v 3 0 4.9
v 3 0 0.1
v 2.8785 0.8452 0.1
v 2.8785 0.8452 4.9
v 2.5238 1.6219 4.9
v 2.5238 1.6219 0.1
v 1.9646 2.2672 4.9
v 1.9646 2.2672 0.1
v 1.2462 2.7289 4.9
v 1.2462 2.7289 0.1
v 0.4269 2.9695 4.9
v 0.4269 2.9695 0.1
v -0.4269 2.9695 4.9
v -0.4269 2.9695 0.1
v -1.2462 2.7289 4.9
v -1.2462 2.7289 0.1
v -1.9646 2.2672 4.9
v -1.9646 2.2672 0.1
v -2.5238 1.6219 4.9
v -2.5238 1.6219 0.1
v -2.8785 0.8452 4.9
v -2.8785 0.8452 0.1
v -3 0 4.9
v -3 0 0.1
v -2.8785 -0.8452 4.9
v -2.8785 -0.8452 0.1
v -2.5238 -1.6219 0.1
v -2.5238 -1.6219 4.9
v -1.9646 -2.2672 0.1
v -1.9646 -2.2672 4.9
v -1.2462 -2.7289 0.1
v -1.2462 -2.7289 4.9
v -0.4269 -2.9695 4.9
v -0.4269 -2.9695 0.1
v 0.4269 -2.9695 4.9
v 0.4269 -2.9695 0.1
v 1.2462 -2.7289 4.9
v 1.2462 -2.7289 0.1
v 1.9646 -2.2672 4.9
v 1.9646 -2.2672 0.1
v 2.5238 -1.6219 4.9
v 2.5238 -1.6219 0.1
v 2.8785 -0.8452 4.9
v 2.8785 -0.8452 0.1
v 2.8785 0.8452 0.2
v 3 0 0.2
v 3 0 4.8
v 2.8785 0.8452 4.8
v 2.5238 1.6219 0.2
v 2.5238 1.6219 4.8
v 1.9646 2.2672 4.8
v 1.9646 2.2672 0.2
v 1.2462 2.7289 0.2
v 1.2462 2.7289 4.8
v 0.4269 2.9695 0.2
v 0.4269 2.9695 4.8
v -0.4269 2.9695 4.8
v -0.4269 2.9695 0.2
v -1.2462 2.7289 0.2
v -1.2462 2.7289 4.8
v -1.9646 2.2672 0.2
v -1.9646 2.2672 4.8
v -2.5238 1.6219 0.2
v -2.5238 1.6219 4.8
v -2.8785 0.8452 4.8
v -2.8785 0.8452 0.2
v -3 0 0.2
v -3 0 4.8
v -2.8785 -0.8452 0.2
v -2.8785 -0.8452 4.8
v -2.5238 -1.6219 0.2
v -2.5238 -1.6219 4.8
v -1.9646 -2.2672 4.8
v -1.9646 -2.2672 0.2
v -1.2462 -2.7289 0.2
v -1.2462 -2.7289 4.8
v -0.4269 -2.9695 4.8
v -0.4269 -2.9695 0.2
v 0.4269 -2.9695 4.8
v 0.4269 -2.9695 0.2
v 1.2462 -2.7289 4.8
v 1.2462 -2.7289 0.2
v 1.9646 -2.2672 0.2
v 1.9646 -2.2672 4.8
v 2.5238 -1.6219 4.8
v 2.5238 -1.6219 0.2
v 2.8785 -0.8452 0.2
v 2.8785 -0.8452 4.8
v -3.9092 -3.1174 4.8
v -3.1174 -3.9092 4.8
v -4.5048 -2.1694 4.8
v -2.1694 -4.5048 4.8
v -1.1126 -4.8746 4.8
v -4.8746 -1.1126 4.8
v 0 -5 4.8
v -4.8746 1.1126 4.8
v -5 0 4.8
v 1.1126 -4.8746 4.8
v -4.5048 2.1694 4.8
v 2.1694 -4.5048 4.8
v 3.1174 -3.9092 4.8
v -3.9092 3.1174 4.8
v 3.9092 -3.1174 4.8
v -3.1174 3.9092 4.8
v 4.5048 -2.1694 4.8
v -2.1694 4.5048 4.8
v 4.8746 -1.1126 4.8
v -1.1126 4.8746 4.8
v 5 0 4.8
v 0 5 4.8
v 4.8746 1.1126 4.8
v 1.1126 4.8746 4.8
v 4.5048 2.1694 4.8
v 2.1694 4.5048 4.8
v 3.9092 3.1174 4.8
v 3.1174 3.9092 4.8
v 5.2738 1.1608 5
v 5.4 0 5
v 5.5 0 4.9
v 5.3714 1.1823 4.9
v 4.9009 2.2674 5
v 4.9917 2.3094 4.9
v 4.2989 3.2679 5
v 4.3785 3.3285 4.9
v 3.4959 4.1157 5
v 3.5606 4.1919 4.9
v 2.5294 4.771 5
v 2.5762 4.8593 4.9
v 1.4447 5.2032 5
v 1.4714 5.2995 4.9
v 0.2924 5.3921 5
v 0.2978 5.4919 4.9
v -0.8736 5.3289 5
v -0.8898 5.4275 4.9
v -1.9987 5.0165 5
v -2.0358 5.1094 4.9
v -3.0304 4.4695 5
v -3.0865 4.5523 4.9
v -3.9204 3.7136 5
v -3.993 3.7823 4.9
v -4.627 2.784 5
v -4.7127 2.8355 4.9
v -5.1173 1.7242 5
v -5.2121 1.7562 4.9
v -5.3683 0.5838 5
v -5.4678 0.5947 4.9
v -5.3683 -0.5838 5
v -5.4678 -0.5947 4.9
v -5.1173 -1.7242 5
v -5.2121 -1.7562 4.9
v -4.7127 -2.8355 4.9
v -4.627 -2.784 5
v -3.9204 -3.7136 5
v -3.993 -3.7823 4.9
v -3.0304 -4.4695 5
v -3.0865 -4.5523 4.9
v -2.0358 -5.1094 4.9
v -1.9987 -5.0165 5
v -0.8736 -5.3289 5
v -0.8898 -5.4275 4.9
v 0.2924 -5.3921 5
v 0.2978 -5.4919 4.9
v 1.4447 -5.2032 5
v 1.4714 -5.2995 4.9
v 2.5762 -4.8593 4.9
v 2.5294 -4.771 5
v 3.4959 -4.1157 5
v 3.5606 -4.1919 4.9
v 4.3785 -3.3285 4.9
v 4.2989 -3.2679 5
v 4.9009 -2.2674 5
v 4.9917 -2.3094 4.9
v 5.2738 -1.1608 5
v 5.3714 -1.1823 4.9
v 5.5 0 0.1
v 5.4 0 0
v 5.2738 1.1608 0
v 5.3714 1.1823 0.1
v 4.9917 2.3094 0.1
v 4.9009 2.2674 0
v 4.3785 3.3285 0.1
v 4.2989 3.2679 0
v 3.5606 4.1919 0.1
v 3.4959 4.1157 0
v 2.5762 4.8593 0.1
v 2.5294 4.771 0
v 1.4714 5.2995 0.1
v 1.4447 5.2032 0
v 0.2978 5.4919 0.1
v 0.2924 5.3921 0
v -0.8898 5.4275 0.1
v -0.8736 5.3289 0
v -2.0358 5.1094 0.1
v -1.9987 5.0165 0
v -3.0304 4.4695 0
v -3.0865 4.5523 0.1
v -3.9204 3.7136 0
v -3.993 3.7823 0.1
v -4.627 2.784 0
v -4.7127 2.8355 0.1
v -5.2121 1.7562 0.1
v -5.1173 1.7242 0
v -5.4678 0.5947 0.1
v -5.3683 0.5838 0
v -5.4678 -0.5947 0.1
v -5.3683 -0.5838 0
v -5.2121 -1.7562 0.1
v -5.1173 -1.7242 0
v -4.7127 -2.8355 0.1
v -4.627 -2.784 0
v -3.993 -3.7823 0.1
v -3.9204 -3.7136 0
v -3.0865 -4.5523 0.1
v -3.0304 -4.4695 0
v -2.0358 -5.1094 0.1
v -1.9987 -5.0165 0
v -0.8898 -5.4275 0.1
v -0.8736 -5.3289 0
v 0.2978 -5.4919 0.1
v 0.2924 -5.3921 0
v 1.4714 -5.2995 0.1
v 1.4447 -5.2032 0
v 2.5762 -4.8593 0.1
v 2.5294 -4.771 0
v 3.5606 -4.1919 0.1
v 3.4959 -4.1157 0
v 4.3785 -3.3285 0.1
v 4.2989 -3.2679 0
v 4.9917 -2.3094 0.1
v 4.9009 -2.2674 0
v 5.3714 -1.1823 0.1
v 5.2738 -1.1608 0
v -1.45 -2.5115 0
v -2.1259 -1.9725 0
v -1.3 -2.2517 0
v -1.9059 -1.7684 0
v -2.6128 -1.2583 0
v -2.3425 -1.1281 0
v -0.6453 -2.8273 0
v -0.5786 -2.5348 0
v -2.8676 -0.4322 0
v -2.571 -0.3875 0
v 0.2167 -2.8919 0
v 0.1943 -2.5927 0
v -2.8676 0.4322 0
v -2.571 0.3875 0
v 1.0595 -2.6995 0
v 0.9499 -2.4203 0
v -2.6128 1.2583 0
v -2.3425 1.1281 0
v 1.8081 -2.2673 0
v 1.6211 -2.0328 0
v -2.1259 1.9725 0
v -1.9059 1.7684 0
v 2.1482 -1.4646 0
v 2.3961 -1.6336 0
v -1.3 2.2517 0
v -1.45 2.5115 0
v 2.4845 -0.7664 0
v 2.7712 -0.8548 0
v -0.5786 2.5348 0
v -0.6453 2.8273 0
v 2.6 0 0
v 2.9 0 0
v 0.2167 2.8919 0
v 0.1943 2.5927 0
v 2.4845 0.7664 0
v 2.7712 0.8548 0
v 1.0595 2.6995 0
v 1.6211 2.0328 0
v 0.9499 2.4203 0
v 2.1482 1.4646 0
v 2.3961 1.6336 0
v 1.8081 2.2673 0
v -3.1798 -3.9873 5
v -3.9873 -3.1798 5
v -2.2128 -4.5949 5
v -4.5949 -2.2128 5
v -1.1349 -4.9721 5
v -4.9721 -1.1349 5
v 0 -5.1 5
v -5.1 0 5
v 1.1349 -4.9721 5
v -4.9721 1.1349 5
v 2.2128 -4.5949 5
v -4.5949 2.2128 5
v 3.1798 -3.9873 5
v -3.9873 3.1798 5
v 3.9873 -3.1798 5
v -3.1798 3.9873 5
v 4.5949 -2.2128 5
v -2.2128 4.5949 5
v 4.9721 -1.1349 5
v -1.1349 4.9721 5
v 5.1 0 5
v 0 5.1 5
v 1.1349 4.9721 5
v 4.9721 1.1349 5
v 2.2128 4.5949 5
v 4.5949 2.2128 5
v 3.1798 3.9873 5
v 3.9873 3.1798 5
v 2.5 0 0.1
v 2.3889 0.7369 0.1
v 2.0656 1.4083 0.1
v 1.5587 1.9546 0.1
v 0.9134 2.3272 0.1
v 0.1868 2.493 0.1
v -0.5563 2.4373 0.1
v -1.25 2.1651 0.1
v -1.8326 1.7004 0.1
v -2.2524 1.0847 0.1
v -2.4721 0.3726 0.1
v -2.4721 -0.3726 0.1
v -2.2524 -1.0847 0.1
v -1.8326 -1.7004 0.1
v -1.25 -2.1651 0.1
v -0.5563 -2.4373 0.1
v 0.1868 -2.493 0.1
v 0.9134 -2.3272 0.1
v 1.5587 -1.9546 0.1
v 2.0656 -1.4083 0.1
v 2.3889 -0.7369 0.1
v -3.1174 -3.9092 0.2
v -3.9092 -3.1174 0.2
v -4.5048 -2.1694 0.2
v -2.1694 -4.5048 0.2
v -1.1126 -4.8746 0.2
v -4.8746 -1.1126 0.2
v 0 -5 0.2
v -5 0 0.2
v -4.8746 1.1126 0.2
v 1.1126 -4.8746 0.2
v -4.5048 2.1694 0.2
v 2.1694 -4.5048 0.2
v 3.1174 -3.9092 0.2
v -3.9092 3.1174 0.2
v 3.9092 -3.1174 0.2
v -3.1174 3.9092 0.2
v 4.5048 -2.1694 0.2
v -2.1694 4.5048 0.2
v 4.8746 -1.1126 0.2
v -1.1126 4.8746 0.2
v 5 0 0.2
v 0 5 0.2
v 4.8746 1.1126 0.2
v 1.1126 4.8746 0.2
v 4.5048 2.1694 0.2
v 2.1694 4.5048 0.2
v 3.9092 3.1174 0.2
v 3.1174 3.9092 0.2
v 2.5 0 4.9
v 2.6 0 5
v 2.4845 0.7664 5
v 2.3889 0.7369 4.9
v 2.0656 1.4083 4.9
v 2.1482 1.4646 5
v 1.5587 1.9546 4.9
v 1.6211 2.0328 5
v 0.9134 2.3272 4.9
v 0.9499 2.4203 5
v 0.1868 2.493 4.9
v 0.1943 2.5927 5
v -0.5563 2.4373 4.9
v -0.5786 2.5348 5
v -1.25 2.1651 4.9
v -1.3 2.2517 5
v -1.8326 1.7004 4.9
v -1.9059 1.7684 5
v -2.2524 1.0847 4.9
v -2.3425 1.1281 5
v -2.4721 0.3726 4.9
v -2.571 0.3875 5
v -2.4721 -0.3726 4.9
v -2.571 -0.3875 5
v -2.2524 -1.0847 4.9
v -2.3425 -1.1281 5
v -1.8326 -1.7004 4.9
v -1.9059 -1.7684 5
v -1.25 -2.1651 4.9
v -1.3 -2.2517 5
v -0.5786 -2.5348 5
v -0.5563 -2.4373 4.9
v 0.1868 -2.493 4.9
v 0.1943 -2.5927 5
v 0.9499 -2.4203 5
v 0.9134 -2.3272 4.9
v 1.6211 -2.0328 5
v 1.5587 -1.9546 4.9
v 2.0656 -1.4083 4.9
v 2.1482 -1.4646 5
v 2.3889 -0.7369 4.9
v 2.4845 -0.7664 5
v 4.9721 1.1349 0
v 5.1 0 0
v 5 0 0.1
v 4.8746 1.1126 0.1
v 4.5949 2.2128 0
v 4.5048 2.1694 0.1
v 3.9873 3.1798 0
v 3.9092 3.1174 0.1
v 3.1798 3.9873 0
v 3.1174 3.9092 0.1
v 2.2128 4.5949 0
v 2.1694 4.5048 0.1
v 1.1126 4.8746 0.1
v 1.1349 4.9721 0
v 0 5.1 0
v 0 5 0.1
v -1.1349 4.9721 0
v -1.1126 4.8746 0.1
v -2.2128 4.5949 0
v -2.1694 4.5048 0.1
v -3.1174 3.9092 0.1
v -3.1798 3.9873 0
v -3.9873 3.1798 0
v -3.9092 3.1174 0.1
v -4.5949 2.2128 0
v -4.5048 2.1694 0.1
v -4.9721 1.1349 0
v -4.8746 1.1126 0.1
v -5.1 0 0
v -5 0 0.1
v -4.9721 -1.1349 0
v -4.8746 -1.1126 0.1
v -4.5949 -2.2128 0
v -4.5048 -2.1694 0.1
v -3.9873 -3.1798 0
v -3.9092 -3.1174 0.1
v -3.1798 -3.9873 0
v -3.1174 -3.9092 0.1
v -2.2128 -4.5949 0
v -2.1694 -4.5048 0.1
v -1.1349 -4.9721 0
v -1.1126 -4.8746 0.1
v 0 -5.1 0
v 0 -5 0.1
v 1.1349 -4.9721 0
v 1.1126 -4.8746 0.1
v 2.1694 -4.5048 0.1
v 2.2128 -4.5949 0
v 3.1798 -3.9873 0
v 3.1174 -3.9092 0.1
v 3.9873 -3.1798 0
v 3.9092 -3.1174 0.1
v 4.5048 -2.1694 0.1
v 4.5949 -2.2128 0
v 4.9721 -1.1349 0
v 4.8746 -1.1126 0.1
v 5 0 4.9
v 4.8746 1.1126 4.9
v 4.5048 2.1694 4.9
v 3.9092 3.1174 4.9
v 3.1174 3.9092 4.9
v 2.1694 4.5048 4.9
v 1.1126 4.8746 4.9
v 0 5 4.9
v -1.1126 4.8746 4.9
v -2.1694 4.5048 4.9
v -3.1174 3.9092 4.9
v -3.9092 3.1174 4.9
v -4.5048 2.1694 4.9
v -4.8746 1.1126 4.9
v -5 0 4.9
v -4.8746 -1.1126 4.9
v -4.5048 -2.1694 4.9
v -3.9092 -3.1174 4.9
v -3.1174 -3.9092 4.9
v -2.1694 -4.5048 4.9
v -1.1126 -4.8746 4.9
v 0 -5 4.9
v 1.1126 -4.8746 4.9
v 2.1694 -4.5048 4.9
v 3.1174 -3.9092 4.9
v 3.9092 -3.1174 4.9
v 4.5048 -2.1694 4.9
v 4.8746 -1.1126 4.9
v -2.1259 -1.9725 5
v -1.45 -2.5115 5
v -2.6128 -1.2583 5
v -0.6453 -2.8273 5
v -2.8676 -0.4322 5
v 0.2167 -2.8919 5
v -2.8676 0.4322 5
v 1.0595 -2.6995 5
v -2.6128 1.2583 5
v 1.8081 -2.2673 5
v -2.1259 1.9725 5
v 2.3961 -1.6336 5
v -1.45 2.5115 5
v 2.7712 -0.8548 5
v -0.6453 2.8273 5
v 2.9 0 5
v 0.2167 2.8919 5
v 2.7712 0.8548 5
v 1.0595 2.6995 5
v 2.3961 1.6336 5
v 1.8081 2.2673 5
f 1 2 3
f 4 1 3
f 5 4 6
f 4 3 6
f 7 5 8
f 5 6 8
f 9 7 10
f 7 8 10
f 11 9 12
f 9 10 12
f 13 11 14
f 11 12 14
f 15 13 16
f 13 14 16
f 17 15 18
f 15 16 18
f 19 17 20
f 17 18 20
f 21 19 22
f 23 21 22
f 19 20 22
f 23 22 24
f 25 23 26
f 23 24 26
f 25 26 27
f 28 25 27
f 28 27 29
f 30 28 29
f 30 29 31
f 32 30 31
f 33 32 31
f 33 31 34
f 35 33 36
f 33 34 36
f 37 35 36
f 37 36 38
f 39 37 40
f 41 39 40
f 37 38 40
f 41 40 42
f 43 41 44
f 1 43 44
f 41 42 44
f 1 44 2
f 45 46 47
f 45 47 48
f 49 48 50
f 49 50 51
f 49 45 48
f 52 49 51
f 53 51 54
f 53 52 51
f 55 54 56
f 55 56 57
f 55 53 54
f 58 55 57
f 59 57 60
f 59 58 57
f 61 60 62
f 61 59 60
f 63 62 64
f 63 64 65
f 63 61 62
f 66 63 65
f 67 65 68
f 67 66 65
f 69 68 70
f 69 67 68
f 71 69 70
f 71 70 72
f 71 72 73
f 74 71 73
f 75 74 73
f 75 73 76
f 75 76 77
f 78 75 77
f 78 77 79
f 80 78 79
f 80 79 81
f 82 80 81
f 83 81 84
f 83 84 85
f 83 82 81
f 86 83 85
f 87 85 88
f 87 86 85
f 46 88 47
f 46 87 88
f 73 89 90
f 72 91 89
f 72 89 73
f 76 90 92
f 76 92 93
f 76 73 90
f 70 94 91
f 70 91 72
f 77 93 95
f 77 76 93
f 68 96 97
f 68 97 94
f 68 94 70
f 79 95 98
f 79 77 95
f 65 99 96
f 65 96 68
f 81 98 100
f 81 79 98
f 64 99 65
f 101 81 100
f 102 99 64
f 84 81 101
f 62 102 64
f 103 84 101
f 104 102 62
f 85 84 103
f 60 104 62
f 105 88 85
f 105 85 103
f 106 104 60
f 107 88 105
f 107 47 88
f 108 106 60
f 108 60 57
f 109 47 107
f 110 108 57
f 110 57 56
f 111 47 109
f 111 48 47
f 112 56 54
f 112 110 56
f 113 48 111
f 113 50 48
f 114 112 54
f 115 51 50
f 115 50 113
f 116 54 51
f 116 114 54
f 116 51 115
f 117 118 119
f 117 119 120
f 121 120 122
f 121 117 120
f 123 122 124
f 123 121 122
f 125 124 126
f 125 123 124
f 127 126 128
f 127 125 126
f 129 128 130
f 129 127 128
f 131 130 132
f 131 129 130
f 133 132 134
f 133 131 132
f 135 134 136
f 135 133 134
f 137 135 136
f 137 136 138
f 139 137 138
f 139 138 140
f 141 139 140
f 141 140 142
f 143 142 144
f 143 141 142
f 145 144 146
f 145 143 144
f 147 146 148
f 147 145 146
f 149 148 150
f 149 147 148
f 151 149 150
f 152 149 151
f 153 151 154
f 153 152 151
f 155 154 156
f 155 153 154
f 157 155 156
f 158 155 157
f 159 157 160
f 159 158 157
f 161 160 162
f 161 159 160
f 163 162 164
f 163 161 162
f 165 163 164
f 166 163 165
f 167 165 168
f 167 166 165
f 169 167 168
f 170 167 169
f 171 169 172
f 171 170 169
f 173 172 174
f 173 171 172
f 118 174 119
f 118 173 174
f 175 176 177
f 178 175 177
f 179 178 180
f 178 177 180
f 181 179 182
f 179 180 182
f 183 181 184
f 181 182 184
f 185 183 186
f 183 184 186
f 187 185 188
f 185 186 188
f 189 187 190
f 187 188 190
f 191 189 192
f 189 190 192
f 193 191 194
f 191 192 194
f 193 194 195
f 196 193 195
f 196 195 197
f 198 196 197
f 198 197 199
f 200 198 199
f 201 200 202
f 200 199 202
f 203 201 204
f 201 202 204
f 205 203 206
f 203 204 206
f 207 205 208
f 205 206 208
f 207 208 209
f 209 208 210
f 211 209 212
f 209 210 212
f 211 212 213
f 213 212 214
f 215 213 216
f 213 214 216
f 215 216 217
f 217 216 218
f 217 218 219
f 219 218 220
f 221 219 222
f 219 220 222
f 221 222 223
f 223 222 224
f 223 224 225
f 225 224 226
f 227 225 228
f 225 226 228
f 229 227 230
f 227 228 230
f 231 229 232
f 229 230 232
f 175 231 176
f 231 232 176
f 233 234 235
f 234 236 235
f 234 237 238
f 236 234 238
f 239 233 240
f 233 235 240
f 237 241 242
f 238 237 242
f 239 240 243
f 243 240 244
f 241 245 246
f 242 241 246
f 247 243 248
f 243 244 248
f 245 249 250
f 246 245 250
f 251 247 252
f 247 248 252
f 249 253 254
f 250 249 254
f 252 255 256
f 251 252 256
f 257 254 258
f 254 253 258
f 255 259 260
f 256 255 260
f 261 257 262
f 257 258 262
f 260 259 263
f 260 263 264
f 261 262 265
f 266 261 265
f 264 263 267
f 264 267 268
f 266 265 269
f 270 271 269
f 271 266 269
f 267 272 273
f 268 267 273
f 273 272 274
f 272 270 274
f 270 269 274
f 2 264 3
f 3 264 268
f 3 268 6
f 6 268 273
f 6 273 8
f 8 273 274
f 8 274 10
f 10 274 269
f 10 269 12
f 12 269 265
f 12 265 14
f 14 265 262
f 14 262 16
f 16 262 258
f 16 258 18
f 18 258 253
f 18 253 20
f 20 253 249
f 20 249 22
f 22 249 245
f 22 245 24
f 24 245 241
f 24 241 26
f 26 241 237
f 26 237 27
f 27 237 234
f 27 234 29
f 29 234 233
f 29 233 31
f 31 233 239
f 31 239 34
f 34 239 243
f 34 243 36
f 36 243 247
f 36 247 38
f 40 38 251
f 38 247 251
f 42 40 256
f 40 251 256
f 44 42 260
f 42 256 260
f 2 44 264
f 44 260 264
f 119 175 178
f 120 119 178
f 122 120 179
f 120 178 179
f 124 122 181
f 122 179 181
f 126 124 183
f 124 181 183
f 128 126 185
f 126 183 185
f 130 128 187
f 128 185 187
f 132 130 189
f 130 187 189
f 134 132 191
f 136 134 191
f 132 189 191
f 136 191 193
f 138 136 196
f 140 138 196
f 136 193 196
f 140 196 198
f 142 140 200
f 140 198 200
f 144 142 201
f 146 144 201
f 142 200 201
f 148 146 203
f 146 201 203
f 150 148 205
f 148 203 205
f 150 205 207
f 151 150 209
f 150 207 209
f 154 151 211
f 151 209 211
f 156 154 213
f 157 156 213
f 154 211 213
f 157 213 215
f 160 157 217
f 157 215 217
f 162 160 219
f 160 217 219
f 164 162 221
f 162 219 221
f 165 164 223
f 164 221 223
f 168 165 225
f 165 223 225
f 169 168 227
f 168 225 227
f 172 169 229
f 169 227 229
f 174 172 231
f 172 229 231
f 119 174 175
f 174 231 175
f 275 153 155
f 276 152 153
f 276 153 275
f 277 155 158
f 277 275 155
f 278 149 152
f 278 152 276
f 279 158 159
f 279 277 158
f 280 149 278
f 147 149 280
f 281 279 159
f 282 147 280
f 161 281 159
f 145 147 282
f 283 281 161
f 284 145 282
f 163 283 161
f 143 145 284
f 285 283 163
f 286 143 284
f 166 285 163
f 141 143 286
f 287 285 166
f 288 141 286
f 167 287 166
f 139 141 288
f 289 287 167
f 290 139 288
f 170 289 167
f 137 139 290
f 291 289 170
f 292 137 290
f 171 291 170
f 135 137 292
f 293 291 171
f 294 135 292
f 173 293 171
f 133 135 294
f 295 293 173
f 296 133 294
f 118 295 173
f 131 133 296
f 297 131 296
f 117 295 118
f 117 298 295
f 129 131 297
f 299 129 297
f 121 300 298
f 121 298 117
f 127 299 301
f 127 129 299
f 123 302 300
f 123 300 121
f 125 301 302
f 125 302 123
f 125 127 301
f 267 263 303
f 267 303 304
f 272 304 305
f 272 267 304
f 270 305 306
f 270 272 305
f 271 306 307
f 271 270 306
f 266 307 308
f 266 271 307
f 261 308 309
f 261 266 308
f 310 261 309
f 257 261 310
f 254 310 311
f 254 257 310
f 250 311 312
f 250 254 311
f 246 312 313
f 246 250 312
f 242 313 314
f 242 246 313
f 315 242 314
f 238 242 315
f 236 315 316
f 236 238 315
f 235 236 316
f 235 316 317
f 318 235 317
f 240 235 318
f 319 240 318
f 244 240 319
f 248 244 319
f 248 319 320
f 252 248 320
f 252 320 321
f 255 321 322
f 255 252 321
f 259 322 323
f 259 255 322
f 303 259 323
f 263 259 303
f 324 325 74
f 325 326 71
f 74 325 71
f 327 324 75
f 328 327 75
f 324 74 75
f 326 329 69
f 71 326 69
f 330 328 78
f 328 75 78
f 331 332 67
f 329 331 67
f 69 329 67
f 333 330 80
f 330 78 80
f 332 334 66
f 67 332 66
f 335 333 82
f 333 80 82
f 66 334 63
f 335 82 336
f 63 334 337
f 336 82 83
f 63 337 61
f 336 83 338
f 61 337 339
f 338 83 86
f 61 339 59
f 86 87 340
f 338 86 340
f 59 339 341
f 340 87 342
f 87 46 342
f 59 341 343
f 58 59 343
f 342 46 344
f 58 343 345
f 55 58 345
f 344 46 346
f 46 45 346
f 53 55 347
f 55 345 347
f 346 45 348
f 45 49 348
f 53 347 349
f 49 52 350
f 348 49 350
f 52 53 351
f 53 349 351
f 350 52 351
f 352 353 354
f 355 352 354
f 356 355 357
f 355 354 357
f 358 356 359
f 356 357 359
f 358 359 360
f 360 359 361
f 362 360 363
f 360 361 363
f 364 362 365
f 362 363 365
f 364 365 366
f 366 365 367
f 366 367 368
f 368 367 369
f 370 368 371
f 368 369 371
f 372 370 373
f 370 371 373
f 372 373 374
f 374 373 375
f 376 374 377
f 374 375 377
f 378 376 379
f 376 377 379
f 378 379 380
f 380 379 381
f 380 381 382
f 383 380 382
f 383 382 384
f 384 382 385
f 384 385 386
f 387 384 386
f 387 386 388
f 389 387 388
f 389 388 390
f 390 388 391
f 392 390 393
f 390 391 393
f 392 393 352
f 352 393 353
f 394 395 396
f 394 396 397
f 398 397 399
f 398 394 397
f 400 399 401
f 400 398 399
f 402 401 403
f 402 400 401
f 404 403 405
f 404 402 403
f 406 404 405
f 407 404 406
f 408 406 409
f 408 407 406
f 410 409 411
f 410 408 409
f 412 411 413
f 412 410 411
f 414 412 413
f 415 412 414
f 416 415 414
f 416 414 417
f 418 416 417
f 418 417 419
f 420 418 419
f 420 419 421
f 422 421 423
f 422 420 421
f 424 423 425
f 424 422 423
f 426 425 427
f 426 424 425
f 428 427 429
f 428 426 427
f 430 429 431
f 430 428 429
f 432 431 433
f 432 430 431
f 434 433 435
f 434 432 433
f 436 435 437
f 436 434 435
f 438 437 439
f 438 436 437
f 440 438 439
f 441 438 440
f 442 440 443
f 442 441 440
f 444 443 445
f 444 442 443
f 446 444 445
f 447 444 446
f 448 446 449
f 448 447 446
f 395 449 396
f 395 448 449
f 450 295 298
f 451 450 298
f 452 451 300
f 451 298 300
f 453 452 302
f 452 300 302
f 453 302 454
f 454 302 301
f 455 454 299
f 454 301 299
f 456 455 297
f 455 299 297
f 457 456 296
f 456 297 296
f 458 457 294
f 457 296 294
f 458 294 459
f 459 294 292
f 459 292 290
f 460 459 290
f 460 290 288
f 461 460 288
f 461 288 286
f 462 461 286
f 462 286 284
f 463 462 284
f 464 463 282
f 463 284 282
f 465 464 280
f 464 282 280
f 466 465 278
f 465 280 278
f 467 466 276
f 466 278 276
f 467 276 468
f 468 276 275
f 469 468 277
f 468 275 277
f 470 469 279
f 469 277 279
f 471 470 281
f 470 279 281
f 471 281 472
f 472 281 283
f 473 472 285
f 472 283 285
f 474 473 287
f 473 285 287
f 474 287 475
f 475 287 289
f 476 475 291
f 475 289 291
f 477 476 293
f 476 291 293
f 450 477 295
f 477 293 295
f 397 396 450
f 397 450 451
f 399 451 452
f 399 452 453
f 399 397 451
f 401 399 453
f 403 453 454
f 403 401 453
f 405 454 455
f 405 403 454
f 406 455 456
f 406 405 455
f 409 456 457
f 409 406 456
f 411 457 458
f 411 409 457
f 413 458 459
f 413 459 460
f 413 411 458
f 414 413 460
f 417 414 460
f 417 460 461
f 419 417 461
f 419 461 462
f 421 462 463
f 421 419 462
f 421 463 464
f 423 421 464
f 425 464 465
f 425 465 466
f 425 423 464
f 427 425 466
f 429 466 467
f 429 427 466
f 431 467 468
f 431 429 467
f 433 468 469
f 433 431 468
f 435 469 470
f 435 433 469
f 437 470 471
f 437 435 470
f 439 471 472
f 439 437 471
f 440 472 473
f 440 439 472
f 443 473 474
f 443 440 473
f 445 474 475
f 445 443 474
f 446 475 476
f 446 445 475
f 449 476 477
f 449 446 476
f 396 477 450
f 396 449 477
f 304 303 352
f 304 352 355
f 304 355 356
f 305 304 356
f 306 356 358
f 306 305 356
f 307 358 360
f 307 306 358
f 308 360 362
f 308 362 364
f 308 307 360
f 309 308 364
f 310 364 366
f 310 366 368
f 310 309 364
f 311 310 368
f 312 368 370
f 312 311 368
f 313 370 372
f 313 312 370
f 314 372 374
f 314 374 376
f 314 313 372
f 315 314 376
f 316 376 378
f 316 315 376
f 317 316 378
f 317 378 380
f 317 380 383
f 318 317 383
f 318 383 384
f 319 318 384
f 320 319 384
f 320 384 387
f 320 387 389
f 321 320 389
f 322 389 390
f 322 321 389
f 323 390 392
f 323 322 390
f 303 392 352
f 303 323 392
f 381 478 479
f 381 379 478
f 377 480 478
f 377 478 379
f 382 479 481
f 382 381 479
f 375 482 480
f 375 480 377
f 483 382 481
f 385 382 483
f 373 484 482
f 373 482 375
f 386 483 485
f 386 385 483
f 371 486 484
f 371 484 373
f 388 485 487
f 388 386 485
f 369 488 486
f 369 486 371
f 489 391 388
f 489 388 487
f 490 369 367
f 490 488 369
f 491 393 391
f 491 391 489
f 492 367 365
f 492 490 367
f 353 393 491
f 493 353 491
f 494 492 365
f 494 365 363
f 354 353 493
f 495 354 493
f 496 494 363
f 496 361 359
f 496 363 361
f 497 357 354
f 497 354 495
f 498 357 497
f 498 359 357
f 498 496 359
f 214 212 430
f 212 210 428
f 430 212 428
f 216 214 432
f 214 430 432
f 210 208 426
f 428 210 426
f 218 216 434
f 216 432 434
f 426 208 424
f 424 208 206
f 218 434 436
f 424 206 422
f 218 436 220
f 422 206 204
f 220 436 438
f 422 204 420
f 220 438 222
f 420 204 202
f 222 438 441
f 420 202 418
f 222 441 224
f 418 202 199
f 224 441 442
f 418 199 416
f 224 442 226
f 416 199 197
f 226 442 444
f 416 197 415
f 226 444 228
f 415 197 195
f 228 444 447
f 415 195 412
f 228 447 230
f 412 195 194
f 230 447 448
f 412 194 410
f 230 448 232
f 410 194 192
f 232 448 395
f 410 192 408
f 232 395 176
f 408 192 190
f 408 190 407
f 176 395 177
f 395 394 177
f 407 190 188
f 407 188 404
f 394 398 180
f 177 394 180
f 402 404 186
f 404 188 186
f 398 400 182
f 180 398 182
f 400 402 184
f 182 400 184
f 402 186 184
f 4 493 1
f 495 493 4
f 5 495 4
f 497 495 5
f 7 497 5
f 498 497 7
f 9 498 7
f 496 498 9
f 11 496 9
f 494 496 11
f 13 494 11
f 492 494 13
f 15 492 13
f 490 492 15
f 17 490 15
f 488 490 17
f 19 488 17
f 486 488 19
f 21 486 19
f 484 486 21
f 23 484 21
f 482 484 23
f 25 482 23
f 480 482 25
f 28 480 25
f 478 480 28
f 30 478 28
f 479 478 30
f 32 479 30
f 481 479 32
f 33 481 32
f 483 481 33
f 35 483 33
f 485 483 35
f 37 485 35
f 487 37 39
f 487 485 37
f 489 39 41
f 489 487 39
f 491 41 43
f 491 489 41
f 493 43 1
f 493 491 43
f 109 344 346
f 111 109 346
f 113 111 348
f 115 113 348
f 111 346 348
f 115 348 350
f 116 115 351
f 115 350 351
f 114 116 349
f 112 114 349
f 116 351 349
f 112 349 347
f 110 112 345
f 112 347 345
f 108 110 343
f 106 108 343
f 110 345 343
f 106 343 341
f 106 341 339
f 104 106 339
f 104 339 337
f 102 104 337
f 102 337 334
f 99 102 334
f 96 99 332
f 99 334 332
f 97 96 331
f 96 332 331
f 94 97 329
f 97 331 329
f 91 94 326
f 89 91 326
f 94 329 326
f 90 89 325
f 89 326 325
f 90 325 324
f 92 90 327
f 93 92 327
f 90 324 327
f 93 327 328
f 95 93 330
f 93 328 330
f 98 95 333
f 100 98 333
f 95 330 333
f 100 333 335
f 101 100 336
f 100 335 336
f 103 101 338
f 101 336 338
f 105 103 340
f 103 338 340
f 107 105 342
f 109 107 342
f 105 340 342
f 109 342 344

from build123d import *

# Parameters (mm, degrees)
F0_R      = 3
F0_R_2    = 2.5
F1_DEPTH  = 5
F0_R_3    = 5.5
F0_R_4    = 5
F2_START  = 0.2
F2_DEPTH  = 4.6
F3_SIZE   = 0.1
F3_2_SIZE = 0.1


with BuildPart() as f1:
    # F0 (on Top) → F1 (new body)
    with BuildSketch(Plane.XY):
        Circle(F0_R)
        Circle(F0_R_2, mode=Mode.SUBTRACT)
    extrude(amount=F1_DEPTH)

    # F3
    f3_edges = [f1.edges().sort_by_distance(p)[0] for p in [
        (-3, 0, 0),
        (-2.5, 0, 0),
        (-3, 0, 5),
        (-2.5, 0, 5),
    ]]
    chamfer(f3_edges, length=F3_SIZE)


with BuildPart() as f1b:
    # F0 (on Top) → F1, piece 2 (new body)
    with BuildSketch(Plane.XY):
        Circle(F0_R_3)
        Circle(F0_R_4, mode=Mode.SUBTRACT)
    extrude(amount=F1_DEPTH)

    # F3#2
    f3_2_edges = [f1b.edges().sort_by_distance(p)[0] for p in [
        (-5.5, 0, 5),
        (-5, 0, 5),
        (-5.5, 0, 0),
        (-5, 0, 0),
    ]]
    chamfer(f3_2_edges, length=F3_2_SIZE)


with BuildPart() as f2:
    # F0 (on Top) → F2 (new body)
    with BuildSketch(Plane.XY.offset(F2_START)):
        Circle(F0_R_4)
        Circle(F0_R, mode=Mode.SUBTRACT)
    extrude(amount=F2_DEPTH)


solid = Compound([f1.part, f1b.part, f2.part])
